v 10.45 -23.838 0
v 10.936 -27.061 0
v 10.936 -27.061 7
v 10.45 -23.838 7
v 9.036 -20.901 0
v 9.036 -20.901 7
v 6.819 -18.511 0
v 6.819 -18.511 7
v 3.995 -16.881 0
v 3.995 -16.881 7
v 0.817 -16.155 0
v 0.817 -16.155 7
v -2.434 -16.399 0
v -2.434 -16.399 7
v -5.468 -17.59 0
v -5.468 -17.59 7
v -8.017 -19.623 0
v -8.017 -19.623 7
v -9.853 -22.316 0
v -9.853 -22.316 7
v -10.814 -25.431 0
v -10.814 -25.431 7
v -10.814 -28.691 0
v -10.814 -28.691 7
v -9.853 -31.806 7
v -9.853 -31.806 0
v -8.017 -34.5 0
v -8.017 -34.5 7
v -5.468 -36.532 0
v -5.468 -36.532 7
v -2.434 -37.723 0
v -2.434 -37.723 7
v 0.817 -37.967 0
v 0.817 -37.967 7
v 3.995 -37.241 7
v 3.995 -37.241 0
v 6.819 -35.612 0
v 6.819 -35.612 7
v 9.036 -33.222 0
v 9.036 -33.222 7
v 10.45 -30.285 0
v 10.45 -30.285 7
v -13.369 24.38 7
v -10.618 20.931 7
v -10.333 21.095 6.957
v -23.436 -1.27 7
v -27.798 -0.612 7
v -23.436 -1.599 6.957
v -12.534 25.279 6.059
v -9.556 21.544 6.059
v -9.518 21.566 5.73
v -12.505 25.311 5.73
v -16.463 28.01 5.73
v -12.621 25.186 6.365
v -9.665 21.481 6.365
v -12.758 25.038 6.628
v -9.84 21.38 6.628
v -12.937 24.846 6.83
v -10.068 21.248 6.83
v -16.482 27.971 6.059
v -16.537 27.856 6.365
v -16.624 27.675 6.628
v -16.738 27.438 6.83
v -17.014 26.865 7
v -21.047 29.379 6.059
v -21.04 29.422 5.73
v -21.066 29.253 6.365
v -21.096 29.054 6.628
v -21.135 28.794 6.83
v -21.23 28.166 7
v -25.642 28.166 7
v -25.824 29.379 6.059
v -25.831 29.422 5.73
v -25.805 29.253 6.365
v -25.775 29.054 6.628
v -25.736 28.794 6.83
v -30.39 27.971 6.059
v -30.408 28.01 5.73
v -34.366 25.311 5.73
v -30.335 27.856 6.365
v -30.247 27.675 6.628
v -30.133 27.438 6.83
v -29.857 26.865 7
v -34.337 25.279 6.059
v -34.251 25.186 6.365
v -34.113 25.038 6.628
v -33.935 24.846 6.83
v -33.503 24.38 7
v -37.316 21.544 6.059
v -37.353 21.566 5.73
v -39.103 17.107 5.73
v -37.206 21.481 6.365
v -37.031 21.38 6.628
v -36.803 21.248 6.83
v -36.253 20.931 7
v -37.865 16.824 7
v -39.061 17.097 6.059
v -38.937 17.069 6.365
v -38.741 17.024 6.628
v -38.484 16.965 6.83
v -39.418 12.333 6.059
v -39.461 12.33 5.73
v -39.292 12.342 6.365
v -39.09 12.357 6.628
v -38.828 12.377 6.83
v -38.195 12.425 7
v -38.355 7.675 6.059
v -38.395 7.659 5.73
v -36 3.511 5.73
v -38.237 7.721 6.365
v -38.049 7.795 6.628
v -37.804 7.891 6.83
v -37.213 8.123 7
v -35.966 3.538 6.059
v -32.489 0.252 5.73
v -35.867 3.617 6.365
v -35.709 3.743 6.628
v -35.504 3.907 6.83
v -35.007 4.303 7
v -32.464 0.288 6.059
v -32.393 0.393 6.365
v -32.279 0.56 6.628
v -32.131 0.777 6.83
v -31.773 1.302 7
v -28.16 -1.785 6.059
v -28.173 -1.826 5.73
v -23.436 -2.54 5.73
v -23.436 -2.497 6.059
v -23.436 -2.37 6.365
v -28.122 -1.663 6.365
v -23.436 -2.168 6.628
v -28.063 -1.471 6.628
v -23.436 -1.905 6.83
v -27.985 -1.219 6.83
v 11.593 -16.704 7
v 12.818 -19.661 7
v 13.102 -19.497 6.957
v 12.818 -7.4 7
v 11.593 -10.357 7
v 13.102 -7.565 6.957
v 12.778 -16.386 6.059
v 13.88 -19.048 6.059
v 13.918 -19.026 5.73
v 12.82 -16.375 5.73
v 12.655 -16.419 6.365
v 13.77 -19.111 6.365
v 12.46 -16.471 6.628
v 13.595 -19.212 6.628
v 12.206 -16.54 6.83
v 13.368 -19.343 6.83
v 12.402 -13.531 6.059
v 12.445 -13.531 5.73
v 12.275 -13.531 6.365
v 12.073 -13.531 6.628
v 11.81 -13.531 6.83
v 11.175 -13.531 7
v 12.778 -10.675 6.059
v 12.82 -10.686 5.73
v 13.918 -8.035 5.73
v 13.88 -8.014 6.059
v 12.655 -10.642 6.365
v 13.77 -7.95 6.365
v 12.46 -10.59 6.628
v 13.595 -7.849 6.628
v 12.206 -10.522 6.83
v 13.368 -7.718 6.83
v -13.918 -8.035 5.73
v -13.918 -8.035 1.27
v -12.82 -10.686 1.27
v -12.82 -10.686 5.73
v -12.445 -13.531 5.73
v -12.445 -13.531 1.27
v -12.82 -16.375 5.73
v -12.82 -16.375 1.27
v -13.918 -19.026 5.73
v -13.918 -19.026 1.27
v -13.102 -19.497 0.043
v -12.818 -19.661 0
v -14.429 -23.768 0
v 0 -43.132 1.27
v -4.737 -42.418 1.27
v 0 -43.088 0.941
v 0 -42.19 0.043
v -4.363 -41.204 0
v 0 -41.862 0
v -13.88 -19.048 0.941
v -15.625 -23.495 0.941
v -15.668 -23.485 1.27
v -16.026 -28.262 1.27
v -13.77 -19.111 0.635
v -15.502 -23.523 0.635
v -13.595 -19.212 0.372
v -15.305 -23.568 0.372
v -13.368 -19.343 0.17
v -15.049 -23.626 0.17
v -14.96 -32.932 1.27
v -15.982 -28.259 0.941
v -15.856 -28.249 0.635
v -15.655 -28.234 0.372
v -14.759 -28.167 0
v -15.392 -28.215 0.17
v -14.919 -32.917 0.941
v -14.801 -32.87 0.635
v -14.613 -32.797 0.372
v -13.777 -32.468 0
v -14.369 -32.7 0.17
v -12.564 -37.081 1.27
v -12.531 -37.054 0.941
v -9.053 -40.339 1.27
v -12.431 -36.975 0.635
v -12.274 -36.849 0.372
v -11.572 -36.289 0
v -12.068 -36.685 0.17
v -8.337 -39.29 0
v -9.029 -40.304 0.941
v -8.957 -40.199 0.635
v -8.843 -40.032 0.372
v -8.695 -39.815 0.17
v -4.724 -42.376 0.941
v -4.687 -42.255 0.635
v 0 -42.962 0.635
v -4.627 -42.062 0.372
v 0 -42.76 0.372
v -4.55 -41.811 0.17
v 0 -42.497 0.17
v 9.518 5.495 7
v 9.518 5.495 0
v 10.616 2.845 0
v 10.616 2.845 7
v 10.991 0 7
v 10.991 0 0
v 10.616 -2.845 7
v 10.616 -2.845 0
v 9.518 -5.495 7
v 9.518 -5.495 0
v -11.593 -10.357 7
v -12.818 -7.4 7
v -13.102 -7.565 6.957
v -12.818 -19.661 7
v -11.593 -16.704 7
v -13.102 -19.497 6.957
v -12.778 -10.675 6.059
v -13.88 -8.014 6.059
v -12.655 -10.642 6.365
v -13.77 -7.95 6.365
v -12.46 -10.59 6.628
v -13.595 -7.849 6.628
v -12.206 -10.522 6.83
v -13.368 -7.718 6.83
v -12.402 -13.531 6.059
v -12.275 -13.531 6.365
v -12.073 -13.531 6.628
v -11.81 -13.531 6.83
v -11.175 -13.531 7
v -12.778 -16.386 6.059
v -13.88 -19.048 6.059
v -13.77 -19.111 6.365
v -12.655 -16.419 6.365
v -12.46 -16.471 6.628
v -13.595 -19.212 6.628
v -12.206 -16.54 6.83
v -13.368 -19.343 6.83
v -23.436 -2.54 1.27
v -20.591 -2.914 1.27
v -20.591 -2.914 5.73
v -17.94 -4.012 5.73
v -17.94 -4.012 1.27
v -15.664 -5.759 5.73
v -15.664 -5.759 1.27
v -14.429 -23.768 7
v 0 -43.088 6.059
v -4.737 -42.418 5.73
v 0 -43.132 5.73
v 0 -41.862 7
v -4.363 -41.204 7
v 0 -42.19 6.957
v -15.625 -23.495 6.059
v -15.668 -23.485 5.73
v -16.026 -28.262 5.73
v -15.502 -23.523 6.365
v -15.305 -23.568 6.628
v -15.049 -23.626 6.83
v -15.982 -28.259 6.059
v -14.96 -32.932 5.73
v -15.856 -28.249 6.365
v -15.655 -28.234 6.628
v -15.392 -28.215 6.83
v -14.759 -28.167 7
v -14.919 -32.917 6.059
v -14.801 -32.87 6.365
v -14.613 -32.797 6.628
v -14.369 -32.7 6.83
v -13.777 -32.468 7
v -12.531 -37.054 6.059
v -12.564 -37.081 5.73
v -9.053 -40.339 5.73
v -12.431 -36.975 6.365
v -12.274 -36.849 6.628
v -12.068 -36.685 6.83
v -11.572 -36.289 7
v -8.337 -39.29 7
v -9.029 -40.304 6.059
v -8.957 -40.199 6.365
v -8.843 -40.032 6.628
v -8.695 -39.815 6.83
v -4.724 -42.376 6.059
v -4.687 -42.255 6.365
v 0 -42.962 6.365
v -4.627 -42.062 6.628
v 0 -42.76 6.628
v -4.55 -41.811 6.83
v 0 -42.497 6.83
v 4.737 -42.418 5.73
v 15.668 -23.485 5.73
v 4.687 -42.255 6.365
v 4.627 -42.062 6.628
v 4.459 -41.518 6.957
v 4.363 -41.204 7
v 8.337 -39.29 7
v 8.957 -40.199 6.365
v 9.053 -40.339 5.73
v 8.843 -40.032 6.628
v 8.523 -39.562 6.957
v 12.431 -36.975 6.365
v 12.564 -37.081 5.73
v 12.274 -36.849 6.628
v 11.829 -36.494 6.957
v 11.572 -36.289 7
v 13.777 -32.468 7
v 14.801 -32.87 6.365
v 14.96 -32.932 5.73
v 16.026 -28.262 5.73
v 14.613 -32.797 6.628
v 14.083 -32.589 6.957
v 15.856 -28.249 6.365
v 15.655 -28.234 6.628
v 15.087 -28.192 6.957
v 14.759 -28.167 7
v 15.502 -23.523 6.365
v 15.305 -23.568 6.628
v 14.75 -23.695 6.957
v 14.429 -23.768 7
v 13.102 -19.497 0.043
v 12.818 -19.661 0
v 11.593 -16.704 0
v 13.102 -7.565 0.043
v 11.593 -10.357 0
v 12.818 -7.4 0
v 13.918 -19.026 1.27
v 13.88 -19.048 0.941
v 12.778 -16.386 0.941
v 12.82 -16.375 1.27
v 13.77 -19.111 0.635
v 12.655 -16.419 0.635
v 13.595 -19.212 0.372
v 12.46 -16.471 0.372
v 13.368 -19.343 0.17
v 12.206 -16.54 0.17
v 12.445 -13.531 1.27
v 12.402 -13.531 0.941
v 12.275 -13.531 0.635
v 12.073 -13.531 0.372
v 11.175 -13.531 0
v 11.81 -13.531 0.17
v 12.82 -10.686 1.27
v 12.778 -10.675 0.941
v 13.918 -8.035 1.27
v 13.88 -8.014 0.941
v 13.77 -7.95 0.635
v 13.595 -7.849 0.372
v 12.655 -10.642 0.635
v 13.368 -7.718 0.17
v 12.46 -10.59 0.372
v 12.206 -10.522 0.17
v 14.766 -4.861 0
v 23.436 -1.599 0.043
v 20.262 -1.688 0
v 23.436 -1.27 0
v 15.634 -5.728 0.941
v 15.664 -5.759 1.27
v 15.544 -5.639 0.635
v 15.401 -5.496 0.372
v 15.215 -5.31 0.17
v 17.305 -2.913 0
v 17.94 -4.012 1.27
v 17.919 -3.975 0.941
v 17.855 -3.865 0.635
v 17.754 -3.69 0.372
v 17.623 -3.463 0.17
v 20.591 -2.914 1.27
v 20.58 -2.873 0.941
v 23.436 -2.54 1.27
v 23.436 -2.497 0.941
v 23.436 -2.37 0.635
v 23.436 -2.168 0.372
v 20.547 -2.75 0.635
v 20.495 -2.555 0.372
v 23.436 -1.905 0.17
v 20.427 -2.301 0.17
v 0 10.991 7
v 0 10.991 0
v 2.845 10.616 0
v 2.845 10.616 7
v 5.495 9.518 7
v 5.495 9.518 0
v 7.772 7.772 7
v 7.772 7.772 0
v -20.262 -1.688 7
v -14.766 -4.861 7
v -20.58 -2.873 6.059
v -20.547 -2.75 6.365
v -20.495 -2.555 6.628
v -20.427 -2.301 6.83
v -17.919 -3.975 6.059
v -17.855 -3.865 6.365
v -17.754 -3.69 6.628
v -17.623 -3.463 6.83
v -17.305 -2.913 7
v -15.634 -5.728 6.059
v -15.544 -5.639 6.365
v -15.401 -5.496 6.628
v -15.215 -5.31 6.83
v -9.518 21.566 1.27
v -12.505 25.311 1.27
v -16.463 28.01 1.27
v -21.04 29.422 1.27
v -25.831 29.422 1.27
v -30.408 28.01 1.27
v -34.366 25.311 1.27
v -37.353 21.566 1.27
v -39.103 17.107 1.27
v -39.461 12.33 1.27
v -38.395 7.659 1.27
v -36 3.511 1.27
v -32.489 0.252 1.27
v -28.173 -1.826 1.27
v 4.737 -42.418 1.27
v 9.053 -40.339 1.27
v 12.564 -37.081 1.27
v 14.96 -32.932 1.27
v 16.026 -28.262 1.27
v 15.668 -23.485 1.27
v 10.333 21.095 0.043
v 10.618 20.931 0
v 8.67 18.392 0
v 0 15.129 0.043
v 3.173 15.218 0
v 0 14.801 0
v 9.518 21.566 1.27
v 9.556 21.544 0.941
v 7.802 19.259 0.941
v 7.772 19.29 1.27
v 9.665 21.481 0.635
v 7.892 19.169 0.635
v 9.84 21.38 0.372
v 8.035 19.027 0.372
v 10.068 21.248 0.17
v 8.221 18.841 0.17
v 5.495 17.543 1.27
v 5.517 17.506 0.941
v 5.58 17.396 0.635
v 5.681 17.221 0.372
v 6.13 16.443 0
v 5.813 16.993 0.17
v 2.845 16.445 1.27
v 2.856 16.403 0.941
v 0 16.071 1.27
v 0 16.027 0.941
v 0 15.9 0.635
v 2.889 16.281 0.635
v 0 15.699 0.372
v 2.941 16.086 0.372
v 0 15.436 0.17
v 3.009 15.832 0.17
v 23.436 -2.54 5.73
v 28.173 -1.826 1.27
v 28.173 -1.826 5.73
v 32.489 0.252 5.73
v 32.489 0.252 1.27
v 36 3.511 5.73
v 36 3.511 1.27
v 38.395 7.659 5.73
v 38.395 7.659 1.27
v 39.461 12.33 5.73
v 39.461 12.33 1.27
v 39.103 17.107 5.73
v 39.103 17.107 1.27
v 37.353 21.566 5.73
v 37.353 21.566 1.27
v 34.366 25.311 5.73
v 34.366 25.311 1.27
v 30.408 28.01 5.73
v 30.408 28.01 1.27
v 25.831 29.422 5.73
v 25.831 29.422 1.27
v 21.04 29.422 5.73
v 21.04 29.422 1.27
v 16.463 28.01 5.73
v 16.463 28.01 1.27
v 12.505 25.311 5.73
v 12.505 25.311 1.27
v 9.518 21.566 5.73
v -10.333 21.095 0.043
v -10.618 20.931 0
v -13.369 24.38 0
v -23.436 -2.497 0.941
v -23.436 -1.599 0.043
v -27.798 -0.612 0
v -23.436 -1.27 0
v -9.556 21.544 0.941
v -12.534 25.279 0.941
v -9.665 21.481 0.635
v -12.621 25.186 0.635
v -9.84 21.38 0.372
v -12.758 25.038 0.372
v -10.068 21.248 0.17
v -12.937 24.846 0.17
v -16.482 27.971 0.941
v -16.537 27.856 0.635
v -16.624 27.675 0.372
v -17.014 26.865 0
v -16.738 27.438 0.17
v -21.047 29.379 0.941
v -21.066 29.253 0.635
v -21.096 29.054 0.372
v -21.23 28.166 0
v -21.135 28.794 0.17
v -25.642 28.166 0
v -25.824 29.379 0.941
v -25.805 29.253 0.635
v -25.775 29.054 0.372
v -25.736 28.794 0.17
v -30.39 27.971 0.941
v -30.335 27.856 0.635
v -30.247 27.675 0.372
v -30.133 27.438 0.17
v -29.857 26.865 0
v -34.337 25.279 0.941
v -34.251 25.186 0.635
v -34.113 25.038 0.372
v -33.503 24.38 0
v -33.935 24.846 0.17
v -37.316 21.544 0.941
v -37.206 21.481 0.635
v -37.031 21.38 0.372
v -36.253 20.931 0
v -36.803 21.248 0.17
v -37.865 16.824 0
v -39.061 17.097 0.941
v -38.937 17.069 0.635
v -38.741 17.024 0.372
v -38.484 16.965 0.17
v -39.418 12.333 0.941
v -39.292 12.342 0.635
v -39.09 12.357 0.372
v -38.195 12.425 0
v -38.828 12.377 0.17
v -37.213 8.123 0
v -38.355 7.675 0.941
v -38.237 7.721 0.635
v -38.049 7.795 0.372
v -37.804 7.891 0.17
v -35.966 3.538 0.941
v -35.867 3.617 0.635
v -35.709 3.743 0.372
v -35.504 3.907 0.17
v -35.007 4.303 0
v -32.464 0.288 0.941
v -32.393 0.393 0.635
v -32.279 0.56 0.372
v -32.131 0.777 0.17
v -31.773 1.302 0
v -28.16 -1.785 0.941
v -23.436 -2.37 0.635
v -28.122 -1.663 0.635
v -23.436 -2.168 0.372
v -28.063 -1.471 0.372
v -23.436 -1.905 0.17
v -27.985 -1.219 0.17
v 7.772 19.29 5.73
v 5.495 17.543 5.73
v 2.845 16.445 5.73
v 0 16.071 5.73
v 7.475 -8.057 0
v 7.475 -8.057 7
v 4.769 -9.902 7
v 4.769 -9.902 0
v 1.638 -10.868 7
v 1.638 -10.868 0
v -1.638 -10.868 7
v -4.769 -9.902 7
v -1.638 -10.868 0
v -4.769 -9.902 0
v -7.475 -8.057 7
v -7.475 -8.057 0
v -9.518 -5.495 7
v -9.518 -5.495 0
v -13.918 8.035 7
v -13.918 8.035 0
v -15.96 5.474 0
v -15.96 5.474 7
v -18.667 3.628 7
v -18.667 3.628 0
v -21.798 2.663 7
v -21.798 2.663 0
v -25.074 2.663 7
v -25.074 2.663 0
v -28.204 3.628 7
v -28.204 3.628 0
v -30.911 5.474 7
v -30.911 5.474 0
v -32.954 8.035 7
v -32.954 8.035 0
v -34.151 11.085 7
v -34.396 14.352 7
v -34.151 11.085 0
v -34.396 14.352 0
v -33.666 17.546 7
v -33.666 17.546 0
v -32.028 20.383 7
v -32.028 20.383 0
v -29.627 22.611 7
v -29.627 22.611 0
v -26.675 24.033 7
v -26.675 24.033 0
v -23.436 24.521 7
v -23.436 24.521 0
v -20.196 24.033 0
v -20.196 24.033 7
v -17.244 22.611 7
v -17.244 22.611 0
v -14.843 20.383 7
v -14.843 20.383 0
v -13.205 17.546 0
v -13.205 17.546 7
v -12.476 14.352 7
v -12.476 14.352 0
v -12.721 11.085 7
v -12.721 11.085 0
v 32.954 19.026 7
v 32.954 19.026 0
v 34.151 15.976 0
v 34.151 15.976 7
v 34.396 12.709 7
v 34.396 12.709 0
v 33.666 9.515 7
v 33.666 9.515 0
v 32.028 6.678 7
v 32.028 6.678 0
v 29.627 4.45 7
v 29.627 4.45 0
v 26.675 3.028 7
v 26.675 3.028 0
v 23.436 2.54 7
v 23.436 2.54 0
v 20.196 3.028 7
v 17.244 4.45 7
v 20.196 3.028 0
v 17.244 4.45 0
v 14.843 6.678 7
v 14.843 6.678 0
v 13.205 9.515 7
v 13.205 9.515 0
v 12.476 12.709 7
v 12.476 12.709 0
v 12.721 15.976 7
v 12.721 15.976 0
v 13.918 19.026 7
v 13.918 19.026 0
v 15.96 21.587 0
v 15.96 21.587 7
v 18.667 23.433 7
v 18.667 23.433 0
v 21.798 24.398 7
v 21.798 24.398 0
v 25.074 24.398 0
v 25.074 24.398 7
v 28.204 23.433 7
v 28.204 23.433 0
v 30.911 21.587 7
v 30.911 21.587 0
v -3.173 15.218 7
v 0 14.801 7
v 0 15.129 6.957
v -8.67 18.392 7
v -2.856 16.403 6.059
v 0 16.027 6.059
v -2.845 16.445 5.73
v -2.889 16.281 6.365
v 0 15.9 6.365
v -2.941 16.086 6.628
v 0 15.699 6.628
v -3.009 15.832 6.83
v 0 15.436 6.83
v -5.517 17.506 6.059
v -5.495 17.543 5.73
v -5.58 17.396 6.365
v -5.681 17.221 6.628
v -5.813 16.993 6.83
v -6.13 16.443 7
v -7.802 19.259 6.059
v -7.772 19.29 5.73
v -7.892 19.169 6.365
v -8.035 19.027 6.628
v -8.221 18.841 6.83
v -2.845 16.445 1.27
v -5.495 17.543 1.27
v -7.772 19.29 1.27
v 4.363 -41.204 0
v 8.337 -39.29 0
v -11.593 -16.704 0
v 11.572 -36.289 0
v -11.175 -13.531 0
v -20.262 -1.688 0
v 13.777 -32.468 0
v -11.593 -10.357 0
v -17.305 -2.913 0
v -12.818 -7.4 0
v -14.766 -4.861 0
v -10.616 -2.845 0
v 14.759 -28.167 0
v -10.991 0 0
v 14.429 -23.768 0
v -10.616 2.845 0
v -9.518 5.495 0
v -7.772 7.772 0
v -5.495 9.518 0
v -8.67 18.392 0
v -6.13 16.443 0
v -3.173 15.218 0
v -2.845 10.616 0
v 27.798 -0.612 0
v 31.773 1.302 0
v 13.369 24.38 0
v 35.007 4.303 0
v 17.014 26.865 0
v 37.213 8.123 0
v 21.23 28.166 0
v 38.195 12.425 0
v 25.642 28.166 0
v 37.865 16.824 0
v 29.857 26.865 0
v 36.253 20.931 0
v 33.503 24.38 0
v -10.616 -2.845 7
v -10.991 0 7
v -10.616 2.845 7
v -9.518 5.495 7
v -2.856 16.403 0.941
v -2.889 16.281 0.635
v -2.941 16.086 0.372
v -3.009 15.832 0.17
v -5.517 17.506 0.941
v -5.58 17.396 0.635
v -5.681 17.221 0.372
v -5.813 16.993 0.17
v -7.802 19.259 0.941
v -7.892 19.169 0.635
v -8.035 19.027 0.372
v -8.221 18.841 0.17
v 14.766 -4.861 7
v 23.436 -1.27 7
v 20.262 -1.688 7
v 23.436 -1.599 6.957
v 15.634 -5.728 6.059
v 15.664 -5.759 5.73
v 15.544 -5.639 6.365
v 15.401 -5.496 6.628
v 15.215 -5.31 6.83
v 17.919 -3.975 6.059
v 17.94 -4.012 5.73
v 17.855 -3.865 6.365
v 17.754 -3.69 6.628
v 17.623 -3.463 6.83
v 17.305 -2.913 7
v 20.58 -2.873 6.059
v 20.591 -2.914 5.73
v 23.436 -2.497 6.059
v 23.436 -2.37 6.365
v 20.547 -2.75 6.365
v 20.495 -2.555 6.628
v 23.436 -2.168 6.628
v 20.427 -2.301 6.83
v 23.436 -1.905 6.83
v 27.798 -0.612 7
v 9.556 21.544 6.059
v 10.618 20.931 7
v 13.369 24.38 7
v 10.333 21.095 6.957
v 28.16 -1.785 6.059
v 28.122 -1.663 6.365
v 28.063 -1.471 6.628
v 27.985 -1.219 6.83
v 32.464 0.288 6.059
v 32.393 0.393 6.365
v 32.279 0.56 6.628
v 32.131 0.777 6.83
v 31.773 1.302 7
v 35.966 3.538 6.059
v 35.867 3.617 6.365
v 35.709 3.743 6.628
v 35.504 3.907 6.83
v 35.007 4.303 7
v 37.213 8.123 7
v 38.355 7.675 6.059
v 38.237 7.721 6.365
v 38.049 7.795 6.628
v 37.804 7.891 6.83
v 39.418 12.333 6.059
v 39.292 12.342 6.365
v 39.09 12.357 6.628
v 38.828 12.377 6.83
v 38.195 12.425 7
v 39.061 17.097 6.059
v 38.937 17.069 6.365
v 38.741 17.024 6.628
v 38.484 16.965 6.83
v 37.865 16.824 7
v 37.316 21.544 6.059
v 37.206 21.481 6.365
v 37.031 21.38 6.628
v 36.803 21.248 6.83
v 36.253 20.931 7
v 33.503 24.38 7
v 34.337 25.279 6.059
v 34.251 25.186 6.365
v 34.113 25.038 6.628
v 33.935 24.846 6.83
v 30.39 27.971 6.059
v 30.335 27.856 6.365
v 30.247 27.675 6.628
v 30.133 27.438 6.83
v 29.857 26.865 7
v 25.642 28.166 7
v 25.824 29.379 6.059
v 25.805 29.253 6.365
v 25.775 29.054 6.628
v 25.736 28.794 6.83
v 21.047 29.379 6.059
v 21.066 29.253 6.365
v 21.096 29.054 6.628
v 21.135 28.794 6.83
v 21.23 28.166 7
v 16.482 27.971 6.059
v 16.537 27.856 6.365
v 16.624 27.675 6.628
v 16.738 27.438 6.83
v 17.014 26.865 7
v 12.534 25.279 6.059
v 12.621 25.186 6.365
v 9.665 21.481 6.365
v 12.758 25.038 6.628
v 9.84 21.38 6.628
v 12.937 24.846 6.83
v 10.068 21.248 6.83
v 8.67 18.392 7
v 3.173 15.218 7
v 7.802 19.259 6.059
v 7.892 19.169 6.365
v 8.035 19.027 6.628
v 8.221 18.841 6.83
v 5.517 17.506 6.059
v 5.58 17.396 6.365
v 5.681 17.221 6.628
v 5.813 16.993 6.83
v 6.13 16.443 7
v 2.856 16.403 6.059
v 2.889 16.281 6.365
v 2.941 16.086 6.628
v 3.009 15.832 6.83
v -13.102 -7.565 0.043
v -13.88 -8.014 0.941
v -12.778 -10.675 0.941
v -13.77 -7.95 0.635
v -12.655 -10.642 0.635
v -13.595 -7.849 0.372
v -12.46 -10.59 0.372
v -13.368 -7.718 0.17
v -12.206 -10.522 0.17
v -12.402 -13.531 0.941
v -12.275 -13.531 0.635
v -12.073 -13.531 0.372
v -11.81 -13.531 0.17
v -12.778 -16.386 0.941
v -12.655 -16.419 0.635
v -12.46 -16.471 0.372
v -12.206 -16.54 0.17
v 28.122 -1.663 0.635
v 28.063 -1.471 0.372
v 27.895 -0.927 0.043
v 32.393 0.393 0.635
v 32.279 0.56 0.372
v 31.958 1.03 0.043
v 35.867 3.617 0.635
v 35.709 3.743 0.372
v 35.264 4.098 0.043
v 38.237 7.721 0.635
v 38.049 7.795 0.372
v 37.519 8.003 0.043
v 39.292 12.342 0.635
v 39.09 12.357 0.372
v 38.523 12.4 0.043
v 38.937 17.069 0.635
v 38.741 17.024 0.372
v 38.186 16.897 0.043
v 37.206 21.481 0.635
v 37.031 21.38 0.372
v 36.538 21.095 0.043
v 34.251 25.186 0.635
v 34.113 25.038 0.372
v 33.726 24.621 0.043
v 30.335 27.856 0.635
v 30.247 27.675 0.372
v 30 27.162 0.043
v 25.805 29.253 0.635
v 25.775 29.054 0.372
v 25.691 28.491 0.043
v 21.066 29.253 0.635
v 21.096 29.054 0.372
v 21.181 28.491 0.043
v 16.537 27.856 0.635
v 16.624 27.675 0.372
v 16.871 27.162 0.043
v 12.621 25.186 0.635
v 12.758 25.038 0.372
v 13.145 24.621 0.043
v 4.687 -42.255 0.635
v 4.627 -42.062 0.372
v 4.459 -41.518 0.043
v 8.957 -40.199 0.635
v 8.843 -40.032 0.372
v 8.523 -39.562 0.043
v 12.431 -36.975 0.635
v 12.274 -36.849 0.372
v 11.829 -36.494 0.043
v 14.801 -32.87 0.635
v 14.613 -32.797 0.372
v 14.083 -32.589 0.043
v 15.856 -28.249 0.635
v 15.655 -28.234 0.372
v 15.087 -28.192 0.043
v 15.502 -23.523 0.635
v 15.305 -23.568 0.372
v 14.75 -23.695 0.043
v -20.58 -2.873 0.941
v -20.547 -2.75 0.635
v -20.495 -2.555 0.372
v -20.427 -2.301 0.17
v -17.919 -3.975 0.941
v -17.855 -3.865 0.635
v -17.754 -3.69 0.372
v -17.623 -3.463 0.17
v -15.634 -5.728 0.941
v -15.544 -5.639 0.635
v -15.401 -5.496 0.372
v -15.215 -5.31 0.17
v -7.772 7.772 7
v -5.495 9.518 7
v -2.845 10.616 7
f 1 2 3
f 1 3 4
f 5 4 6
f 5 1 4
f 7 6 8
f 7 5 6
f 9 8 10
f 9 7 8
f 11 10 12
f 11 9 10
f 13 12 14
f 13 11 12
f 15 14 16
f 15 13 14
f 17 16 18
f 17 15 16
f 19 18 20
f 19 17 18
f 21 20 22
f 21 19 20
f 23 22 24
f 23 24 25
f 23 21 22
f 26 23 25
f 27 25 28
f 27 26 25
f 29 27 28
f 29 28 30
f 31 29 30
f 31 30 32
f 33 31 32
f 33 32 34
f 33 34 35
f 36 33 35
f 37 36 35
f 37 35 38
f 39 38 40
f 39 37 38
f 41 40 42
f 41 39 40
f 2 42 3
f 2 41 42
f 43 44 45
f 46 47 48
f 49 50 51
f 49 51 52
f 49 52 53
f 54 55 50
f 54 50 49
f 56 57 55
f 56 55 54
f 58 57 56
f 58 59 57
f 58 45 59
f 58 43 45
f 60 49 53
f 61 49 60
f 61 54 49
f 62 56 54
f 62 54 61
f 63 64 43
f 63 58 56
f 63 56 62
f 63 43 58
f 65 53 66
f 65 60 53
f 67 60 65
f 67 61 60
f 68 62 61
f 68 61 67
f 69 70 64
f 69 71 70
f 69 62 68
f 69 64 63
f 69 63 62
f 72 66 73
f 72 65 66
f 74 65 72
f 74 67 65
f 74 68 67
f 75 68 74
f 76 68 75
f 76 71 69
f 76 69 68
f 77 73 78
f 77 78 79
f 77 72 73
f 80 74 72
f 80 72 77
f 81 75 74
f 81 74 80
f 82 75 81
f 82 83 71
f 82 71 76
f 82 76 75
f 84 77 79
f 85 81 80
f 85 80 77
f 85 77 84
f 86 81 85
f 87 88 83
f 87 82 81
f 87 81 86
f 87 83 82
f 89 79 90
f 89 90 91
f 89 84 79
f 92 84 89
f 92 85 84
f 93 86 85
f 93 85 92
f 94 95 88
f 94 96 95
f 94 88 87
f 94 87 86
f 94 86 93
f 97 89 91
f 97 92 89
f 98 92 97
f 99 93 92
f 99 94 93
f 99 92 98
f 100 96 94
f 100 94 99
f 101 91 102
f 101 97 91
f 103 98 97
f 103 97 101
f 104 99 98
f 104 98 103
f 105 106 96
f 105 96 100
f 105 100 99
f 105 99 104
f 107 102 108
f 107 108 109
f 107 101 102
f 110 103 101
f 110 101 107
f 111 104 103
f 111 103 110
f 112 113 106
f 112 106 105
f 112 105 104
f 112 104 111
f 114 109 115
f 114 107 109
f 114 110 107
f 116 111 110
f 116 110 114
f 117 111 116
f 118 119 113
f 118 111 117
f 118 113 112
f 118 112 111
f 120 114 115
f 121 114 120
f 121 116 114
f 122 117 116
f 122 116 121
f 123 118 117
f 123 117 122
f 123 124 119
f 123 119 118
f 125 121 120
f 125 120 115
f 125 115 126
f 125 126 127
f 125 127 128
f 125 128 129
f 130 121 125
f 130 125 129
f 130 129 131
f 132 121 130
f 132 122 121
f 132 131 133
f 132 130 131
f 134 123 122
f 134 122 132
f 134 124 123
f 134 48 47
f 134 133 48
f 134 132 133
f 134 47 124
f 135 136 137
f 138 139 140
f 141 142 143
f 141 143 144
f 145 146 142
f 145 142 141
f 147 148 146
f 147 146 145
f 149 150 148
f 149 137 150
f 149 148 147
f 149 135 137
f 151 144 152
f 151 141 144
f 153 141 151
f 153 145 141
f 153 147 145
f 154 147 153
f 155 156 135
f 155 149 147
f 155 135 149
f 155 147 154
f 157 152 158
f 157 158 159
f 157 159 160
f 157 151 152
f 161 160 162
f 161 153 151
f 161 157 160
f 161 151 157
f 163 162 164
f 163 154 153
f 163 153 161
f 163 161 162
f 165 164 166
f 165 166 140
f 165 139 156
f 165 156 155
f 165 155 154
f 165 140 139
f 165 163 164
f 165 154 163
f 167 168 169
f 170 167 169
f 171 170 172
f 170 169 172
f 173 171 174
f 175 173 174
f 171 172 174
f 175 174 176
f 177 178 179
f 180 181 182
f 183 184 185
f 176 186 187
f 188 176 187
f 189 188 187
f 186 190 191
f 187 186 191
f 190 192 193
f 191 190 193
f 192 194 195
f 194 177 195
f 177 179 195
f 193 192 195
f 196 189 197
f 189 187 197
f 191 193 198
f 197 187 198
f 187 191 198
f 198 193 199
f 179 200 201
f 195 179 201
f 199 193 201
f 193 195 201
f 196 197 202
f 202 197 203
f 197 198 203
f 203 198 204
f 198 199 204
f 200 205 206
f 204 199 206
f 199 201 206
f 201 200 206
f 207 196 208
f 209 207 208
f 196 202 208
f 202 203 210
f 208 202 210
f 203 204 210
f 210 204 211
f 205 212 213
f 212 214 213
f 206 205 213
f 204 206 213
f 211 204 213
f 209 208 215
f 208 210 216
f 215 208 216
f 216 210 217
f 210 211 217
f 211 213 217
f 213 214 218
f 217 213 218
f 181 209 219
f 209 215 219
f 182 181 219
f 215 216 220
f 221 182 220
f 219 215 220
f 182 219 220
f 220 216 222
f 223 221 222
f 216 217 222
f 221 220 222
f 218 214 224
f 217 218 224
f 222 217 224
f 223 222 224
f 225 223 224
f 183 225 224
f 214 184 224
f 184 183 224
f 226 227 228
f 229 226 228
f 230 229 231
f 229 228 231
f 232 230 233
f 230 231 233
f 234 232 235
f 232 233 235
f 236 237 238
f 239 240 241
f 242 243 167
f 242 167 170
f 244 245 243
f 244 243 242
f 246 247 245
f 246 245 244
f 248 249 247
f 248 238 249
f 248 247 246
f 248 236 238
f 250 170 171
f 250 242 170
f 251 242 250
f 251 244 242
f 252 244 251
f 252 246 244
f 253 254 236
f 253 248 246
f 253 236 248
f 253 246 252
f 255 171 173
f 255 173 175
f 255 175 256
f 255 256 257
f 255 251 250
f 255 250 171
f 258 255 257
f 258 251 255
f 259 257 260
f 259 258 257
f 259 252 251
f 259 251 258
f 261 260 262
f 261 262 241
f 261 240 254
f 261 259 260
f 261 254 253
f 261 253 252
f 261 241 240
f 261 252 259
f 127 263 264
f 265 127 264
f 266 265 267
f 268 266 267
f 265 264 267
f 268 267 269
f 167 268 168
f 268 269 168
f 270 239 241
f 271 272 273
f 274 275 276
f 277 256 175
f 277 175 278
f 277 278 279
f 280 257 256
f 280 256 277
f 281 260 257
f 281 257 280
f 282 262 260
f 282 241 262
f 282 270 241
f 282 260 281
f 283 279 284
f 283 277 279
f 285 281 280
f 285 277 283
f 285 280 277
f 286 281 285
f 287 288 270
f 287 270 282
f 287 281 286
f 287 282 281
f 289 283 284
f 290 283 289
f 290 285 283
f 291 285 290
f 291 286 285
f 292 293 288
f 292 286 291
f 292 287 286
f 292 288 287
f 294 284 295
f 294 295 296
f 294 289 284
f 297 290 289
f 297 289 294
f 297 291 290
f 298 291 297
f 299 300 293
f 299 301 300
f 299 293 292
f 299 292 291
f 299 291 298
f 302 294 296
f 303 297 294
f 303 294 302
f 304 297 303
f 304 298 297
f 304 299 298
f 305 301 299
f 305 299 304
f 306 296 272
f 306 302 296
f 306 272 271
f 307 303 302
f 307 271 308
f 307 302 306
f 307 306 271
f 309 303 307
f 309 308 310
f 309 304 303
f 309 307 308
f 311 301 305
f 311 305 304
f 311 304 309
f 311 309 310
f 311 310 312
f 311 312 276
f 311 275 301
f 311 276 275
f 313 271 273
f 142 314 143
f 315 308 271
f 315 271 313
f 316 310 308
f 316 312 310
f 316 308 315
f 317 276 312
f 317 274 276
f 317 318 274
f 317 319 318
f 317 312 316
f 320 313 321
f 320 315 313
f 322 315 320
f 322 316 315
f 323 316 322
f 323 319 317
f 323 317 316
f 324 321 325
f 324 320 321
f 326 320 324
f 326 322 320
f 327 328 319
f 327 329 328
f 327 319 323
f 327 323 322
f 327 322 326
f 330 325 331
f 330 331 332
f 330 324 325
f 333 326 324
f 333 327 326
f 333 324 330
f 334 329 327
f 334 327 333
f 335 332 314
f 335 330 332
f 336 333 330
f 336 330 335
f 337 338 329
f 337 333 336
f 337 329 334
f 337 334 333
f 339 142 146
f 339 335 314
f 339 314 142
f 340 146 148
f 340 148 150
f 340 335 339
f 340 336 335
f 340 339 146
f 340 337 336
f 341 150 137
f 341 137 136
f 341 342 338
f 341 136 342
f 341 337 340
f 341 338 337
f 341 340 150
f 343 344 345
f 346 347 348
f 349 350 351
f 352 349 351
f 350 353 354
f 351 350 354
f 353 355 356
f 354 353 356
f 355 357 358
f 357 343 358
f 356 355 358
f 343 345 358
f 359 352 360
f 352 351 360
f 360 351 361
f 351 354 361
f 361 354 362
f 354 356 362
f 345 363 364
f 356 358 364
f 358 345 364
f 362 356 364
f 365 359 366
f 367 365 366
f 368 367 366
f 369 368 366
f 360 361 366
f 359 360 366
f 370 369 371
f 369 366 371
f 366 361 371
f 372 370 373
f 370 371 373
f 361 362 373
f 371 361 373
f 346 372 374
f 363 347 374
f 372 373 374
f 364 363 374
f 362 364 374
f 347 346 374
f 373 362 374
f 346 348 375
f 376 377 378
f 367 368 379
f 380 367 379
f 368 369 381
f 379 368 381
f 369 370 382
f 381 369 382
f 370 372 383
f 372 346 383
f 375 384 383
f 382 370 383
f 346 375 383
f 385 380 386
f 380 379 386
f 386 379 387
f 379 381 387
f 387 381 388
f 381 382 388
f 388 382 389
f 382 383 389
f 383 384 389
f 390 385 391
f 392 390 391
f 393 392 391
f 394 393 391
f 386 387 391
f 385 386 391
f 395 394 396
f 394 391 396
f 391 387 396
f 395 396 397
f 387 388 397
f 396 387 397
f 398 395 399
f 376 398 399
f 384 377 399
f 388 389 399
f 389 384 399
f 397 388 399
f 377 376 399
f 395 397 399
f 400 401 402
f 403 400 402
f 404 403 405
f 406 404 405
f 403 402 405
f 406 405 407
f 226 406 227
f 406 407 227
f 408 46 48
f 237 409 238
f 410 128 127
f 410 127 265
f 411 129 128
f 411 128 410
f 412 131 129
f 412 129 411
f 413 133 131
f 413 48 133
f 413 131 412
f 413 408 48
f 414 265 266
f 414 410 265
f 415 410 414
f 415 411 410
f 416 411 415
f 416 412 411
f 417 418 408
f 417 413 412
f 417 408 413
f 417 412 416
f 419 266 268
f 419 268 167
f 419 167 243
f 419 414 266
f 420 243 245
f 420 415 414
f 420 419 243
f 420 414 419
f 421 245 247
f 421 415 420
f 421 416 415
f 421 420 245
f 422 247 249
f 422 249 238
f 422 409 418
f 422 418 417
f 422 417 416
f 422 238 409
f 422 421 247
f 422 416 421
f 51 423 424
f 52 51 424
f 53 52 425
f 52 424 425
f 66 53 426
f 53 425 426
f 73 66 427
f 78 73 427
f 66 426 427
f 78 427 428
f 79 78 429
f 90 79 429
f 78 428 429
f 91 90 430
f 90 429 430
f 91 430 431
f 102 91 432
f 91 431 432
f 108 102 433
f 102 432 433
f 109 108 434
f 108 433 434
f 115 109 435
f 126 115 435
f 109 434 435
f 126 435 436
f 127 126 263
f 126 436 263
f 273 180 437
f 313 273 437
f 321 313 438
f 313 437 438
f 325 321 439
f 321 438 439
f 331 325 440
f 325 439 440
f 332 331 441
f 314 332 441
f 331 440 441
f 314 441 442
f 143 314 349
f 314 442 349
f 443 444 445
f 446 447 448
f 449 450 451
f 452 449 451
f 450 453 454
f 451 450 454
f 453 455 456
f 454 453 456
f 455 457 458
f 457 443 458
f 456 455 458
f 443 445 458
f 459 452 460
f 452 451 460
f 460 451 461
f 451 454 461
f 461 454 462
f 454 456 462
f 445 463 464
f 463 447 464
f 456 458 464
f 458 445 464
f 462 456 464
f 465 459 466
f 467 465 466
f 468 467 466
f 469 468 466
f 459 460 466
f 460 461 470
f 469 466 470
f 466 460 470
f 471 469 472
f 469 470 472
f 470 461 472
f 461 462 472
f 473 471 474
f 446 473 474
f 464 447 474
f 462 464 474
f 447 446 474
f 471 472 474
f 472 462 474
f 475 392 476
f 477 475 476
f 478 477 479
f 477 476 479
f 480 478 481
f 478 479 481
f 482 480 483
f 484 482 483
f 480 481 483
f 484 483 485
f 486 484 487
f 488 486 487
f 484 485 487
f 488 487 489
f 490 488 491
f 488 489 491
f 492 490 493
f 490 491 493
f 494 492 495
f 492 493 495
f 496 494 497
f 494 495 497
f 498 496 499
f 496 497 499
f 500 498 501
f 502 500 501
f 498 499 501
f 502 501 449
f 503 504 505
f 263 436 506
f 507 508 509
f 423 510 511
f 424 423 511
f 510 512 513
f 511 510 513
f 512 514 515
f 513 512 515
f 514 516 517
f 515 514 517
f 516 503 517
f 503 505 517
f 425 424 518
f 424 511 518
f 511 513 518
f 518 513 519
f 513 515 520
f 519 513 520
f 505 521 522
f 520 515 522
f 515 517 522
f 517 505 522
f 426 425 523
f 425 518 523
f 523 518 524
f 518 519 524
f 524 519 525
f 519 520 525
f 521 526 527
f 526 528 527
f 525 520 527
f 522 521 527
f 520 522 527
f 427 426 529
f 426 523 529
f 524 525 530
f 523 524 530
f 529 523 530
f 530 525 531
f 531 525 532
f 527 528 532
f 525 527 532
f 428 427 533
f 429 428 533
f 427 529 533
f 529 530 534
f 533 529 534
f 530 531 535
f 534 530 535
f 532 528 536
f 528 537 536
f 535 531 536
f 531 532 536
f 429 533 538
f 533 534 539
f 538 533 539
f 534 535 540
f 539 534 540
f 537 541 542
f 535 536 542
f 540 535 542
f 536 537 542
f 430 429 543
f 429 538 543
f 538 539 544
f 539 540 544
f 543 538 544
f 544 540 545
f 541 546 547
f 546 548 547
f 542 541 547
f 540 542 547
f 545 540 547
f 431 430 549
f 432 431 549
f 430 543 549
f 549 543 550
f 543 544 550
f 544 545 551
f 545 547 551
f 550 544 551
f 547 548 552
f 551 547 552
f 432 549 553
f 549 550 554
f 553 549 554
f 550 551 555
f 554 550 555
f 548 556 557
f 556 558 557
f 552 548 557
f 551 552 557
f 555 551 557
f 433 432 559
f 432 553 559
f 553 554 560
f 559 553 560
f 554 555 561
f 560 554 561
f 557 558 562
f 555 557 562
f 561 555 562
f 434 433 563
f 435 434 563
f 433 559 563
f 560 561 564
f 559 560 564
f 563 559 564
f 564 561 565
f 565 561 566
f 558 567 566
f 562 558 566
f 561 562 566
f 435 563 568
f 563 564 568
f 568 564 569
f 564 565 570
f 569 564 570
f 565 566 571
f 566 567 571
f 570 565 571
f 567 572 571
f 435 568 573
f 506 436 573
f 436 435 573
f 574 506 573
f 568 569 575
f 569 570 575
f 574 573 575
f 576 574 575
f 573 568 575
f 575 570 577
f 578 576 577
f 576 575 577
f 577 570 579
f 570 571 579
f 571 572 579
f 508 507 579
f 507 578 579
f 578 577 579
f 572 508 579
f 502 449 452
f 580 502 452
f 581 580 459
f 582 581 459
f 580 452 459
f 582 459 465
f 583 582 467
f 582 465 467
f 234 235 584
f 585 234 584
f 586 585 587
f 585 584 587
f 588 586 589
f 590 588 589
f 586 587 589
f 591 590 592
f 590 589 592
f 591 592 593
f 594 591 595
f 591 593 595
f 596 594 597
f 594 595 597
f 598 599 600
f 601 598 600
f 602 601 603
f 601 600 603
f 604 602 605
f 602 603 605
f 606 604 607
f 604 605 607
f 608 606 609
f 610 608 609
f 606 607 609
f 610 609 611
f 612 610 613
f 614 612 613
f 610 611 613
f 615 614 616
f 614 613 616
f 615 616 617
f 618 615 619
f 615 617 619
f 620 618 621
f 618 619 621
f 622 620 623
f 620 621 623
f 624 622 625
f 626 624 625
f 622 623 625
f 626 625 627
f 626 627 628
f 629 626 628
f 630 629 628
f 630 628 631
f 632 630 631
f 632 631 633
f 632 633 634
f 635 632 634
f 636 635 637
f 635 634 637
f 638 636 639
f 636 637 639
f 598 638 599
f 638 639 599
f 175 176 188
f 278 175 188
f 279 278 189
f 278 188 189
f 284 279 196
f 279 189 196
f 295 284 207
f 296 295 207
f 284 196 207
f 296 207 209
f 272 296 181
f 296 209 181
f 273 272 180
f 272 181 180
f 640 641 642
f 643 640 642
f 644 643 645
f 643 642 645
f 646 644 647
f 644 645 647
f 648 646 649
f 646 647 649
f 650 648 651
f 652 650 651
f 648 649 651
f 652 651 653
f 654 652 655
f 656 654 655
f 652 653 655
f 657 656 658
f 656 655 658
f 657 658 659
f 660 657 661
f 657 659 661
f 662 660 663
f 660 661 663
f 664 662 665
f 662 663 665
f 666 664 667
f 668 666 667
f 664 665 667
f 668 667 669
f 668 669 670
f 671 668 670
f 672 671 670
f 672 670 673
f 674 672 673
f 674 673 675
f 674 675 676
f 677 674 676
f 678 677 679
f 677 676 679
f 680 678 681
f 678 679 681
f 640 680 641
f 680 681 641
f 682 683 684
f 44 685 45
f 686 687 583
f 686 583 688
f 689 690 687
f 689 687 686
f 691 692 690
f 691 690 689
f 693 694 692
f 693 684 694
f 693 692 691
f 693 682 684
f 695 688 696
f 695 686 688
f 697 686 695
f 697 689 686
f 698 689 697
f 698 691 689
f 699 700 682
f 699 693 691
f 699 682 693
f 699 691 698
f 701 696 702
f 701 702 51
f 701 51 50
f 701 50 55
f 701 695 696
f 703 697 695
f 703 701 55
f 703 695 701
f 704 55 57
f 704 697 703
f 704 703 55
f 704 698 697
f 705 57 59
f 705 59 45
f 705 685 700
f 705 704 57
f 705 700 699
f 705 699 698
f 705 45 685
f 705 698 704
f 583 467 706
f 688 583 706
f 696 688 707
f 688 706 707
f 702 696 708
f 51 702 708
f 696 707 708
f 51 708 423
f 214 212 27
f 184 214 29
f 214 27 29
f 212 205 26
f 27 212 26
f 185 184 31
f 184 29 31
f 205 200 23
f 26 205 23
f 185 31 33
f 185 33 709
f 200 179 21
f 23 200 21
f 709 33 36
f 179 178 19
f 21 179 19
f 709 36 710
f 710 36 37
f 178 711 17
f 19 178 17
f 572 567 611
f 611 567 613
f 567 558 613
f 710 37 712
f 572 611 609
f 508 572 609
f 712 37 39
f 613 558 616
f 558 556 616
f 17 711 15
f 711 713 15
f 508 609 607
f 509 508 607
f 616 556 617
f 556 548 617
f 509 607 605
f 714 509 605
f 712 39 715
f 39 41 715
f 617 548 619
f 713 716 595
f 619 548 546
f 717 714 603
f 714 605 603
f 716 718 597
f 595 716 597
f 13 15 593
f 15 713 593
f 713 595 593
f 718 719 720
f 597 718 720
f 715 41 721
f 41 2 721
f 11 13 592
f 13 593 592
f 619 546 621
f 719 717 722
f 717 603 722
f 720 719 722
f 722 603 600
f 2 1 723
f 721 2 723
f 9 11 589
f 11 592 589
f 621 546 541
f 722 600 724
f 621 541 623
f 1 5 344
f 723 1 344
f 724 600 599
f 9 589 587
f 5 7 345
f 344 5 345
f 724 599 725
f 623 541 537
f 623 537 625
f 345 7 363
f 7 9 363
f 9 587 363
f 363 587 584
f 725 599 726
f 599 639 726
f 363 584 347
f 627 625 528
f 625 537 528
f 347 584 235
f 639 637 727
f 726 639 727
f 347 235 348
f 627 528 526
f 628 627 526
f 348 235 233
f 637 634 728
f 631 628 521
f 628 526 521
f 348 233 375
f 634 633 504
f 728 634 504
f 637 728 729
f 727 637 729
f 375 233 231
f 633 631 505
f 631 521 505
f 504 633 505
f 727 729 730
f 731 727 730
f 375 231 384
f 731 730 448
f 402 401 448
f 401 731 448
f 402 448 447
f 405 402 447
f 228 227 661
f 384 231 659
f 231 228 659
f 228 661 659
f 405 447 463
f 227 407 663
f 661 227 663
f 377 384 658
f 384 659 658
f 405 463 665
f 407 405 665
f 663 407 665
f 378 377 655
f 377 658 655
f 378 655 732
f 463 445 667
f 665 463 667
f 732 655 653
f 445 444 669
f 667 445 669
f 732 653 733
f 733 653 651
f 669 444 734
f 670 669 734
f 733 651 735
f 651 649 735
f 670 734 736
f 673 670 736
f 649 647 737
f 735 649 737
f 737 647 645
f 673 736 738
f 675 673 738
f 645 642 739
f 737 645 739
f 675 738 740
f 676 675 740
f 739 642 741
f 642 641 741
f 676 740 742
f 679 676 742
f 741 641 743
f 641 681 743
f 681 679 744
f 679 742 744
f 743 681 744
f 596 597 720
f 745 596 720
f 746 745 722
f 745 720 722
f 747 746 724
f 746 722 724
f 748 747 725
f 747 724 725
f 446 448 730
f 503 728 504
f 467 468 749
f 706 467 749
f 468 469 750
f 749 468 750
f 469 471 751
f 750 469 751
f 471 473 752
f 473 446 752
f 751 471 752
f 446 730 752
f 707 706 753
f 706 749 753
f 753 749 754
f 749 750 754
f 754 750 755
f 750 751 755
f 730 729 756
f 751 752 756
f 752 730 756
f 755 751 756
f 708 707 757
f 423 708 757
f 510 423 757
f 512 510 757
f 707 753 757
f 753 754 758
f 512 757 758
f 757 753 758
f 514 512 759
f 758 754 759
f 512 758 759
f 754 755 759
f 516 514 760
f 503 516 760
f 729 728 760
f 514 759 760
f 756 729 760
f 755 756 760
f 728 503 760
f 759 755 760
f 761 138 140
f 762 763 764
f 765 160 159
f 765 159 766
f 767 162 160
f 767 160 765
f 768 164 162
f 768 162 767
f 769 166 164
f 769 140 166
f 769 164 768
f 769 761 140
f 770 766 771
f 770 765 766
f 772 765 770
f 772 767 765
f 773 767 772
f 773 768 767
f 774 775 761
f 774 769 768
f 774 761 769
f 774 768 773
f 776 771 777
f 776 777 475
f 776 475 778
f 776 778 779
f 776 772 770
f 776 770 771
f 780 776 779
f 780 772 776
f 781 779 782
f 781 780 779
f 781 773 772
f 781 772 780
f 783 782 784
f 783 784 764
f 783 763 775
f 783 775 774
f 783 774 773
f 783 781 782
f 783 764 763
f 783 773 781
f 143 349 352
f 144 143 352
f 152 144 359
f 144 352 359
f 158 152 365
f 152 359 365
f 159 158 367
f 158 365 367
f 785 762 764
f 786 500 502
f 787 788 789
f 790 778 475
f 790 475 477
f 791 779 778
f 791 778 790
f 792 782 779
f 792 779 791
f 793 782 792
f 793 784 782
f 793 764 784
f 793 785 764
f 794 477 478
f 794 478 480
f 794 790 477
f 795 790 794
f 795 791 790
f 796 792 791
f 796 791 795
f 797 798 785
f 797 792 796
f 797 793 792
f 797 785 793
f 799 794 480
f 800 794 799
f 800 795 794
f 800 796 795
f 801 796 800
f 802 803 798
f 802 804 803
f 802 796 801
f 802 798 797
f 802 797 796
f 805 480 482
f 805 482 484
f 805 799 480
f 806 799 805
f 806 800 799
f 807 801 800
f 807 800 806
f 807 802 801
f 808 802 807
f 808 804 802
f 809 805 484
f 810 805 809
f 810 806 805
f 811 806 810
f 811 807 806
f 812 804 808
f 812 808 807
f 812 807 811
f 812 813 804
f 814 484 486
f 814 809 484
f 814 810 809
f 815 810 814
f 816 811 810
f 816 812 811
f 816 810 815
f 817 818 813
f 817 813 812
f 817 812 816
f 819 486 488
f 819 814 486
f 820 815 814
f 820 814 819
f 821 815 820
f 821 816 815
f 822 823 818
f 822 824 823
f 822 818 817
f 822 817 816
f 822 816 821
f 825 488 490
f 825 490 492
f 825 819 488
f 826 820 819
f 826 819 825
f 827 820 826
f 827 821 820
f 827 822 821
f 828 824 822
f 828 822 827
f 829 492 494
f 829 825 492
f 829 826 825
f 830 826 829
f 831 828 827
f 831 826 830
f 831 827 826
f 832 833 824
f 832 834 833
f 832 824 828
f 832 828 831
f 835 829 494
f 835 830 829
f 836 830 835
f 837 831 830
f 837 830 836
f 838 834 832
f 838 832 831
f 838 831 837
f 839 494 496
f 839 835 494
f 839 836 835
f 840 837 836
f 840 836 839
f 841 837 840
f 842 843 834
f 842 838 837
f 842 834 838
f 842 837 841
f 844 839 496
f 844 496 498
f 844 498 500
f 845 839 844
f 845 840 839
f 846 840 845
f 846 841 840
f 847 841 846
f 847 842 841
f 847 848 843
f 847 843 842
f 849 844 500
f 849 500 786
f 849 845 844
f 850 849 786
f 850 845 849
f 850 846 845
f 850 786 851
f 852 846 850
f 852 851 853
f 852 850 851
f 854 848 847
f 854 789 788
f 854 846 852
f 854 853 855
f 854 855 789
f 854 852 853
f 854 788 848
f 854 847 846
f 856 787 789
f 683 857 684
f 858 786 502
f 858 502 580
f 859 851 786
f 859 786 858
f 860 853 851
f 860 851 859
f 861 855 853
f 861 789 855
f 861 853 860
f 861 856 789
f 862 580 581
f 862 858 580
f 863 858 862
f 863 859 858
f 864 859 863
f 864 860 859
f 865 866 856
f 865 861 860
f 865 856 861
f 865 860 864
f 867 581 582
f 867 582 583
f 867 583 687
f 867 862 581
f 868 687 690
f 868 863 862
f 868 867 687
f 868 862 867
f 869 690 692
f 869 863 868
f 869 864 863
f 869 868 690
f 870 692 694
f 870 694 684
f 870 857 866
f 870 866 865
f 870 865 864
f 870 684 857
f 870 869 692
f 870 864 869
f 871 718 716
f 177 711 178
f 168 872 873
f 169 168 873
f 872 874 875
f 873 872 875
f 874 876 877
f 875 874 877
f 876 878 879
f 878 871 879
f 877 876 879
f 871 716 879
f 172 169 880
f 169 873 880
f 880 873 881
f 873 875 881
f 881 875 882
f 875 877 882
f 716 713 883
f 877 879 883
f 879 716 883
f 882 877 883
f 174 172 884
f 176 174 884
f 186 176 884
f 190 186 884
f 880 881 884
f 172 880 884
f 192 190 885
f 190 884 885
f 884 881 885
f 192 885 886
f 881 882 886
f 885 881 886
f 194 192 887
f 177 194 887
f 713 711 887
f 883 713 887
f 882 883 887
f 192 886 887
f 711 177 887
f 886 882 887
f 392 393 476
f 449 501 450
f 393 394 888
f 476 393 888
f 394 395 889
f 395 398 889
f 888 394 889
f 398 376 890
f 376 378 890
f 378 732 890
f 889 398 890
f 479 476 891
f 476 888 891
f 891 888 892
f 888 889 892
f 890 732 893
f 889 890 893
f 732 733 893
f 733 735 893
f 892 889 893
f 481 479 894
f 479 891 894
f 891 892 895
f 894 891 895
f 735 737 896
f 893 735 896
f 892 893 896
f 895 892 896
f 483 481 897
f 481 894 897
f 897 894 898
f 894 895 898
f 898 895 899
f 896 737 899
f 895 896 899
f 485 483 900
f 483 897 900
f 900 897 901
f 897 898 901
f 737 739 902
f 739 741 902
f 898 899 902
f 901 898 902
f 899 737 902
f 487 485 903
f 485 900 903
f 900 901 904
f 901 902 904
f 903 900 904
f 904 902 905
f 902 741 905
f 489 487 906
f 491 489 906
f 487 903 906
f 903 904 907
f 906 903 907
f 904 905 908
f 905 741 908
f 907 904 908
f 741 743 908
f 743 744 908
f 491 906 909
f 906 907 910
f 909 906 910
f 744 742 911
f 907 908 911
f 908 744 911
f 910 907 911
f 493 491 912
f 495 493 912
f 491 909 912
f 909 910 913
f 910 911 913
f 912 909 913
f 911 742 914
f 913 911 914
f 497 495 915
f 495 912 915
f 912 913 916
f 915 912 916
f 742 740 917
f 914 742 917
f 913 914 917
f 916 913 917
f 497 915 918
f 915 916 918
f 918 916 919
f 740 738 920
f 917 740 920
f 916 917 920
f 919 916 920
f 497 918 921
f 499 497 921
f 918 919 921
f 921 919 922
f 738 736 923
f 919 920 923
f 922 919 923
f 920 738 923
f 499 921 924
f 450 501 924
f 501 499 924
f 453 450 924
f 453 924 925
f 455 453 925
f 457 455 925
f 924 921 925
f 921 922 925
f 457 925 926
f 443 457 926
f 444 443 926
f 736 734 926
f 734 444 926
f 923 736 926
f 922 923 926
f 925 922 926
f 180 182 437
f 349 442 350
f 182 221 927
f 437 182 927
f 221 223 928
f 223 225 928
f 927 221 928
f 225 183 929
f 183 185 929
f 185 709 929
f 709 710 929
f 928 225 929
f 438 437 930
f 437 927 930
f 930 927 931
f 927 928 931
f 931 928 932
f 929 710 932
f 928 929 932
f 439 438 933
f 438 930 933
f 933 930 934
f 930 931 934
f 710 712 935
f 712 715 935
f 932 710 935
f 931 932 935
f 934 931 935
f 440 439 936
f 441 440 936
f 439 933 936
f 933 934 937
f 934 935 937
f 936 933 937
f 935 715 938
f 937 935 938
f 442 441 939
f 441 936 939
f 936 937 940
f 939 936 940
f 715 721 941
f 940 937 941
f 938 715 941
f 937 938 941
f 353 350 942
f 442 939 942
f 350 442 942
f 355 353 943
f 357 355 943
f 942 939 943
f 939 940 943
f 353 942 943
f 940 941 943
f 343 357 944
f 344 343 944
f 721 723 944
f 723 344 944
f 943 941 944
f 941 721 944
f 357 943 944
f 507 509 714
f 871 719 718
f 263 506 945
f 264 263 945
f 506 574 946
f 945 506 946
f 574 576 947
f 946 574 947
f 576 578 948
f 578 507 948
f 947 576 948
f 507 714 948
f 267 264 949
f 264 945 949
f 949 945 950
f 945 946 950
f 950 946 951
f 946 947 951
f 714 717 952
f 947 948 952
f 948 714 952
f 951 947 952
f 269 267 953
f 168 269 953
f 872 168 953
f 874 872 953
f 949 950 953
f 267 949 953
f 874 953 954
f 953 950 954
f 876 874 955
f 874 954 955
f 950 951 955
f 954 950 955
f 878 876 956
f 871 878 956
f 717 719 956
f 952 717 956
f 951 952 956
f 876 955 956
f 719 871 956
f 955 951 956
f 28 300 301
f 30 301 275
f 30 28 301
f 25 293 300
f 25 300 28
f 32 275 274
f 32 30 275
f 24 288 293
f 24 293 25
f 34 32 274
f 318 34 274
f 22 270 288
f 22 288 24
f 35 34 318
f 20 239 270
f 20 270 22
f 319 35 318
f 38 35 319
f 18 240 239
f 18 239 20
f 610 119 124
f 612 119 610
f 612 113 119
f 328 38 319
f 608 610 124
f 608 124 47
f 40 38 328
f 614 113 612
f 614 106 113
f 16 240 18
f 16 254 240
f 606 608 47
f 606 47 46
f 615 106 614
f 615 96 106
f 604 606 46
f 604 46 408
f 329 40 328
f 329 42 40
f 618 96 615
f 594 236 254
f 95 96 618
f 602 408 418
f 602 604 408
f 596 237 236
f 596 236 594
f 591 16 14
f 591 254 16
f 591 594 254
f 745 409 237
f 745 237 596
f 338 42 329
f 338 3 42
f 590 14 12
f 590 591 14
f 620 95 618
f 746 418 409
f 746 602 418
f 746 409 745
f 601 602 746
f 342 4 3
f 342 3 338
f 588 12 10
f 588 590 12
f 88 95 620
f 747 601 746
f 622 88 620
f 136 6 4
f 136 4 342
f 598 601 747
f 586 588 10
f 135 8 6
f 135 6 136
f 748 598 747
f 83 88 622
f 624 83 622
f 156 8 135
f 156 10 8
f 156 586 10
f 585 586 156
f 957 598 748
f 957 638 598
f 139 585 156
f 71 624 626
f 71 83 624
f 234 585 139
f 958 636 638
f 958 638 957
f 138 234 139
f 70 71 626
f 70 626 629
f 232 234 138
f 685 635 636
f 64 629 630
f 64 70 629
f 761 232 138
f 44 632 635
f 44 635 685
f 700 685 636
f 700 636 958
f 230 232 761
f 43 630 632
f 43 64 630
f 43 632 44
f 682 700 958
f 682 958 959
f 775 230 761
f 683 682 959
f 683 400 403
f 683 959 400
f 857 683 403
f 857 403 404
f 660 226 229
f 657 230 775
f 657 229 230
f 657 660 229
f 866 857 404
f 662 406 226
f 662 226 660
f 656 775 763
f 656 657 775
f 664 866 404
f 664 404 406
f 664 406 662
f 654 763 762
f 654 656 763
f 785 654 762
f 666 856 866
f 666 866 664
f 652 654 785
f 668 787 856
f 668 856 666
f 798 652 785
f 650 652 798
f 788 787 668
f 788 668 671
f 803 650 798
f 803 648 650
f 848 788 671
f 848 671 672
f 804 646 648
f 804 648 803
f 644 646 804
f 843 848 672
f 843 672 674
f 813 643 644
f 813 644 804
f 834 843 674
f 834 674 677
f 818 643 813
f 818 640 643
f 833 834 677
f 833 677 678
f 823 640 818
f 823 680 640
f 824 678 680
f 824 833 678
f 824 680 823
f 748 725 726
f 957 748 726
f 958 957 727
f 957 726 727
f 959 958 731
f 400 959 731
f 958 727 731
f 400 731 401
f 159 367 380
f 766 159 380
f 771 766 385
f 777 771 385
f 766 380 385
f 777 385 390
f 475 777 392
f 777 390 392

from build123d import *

# Parameters (mm, degrees)
F0_R     = 10.9363137741
F1_DEPTH = 7.00024
F2_R     = 1.27


with BuildPart() as f1:
    # F0 (on Top) → F1 (new body)
    with BuildSketch(Plane.XY):
        with BuildLine():
            ThreePointArc((0, 10.99058), (5.49529, 9.5181214823), (9.5181214823, 5.49529))
            Line((9.5181214823, 5.49529), (13.9175305336, 8.03529))
            ThreePointArc((13.9175305336, 8.03529), (17.9403620159, 23.0487014823), (32.9537734982, 19.02587))
            Line((32.9537734982, 19.02587), (37.3531825494, 21.56587))
            ThreePointArc((37.3531825494, 21.56587), (23.4356520159, 29.60116), (9.5181214823, 21.56587))
            ThreePointArc((9.5181214823, 21.56587), (5.49529, 17.5430385177), (0, 16.07058))
            Line((0, 16.07058), (0, 10.99058))
        make_face()
        with BuildLine():
            Line((13.9175305336, 8.03529), (9.5181214823, 5.49529))
            ThreePointArc((9.5181214823, 5.49529), (10.99058, 0), (9.5181214823, -5.49529))
            Line((9.5181214823, -5.49529), (13.9175305336, -8.03529))
            ThreePointArc((13.9175305336, -8.03529), (17.9403620159, -4.0124585177), (23.4356520159, -2.54))
            ThreePointArc((23.4356520159, -2.54), (37.3531825494, 5.49529), (37.3531825494, 21.56587))
            Line((37.3531825494, 21.56587), (32.9537734982, 19.02587))
            ThreePointArc((32.9537734982, 19.02587), (28.9309420159, 4.0124585177), (13.9175305336, 8.03529))
        make_face()
        with BuildLine():
            Line((13.9175305336, -8.03529), (9.5181214823, -5.49529))
            ThreePointArc((9.5181214823, -5.49529), (0, -10.99058), (-9.5181214823, -5.49529))
            Line((-9.5181214823, -5.49529), (-13.9175305336, -8.03529))
            ThreePointArc((-13.9175305336, -8.03529), (-12.4450720159, -13.53058), (-13.9175305336, -19.02587))
            ThreePointArc((-13.9175305336, -19.02587), (-13.9175305336, -35.09645), (0, -43.13174))
            ThreePointArc((0, -43.13174), (13.9175305336, -35.09645), (13.9175305336, -19.02587))
            ThreePointArc((13.9175305336, -19.02587), (12.4450720159, -13.53058), (13.9175305336, -8.03529))
        make_face()
        with Locations((0, -27.06116)):
            Circle(F0_R, mode=Mode.SUBTRACT)
        with BuildLine():
            ThreePointArc((-9.5181214823, 5.49529), (-5.49529, 9.5181214823), (0, 10.99058))
            Line((0, 10.99058), (0, 16.07058))
            ThreePointArc((0, 16.07058), (-5.49529, 17.5430385177), (-9.5181214823, 21.56587))
            ThreePointArc((-9.5181214823, 21.56587), (-23.4356520159, 29.60116), (-37.3531825494, 21.56587))
            Line((-37.3531825494, 21.56587), (-32.9537734982, 19.02587))
            ThreePointArc((-32.9537734982, 19.02587), (-17.9403620159, 23.0487014823), (-13.9175305336, 8.03529))
            Line((-13.9175305336, 8.03529), (-9.5181214823, 5.49529))
        make_face()
        with BuildLine():
            Line((-13.9175305336, -8.03529), (-9.5181214823, -5.49529))
            ThreePointArc((-9.5181214823, -5.49529), (-10.99058, 0), (-9.5181214823, 5.49529))
            Line((-9.5181214823, 5.49529), (-13.9175305336, 8.03529))
            ThreePointArc((-13.9175305336, 8.03529), (-28.9309420159, 4.0124585177), (-32.9537734982, 19.02587))
            Line((-32.9537734982, 19.02587), (-37.3531825494, 21.56587))
            ThreePointArc((-37.3531825494, 21.56587), (-37.3531825494, 5.49529), (-23.4356520159, -2.54))
            ThreePointArc((-23.4356520159, -2.54), (-17.9403620159, -4.0124585177), (-13.9175305336, -8.03529))
        make_face()
    extrude(amount=F1_DEPTH)

    # F2
    f2_edges = [f1.edges().sort_by_distance(p)[0] for p in [
        (13.917531, -8.03529, 7.00024),
        (0, -43.13174, 7.00024),
        (-13.917531, -8.03529, 7.00024),
        (-37.353183, 21.56587, 7.00024),
        (0, 16.07058, 7.00024),
        (37.353183, 21.56587, 7.00024),
        (37.353183, 21.56587, 0),
        (13.917531, -8.03529, 0),
        (0, -43.13174, 0),
        (-13.917531, -8.03529, 0),
        (-37.353183, 21.56587, 0),
        (0, 16.07058, 0),
    ]]
    fillet(f2_edges, radius=F2_R)


solid = f1.part
